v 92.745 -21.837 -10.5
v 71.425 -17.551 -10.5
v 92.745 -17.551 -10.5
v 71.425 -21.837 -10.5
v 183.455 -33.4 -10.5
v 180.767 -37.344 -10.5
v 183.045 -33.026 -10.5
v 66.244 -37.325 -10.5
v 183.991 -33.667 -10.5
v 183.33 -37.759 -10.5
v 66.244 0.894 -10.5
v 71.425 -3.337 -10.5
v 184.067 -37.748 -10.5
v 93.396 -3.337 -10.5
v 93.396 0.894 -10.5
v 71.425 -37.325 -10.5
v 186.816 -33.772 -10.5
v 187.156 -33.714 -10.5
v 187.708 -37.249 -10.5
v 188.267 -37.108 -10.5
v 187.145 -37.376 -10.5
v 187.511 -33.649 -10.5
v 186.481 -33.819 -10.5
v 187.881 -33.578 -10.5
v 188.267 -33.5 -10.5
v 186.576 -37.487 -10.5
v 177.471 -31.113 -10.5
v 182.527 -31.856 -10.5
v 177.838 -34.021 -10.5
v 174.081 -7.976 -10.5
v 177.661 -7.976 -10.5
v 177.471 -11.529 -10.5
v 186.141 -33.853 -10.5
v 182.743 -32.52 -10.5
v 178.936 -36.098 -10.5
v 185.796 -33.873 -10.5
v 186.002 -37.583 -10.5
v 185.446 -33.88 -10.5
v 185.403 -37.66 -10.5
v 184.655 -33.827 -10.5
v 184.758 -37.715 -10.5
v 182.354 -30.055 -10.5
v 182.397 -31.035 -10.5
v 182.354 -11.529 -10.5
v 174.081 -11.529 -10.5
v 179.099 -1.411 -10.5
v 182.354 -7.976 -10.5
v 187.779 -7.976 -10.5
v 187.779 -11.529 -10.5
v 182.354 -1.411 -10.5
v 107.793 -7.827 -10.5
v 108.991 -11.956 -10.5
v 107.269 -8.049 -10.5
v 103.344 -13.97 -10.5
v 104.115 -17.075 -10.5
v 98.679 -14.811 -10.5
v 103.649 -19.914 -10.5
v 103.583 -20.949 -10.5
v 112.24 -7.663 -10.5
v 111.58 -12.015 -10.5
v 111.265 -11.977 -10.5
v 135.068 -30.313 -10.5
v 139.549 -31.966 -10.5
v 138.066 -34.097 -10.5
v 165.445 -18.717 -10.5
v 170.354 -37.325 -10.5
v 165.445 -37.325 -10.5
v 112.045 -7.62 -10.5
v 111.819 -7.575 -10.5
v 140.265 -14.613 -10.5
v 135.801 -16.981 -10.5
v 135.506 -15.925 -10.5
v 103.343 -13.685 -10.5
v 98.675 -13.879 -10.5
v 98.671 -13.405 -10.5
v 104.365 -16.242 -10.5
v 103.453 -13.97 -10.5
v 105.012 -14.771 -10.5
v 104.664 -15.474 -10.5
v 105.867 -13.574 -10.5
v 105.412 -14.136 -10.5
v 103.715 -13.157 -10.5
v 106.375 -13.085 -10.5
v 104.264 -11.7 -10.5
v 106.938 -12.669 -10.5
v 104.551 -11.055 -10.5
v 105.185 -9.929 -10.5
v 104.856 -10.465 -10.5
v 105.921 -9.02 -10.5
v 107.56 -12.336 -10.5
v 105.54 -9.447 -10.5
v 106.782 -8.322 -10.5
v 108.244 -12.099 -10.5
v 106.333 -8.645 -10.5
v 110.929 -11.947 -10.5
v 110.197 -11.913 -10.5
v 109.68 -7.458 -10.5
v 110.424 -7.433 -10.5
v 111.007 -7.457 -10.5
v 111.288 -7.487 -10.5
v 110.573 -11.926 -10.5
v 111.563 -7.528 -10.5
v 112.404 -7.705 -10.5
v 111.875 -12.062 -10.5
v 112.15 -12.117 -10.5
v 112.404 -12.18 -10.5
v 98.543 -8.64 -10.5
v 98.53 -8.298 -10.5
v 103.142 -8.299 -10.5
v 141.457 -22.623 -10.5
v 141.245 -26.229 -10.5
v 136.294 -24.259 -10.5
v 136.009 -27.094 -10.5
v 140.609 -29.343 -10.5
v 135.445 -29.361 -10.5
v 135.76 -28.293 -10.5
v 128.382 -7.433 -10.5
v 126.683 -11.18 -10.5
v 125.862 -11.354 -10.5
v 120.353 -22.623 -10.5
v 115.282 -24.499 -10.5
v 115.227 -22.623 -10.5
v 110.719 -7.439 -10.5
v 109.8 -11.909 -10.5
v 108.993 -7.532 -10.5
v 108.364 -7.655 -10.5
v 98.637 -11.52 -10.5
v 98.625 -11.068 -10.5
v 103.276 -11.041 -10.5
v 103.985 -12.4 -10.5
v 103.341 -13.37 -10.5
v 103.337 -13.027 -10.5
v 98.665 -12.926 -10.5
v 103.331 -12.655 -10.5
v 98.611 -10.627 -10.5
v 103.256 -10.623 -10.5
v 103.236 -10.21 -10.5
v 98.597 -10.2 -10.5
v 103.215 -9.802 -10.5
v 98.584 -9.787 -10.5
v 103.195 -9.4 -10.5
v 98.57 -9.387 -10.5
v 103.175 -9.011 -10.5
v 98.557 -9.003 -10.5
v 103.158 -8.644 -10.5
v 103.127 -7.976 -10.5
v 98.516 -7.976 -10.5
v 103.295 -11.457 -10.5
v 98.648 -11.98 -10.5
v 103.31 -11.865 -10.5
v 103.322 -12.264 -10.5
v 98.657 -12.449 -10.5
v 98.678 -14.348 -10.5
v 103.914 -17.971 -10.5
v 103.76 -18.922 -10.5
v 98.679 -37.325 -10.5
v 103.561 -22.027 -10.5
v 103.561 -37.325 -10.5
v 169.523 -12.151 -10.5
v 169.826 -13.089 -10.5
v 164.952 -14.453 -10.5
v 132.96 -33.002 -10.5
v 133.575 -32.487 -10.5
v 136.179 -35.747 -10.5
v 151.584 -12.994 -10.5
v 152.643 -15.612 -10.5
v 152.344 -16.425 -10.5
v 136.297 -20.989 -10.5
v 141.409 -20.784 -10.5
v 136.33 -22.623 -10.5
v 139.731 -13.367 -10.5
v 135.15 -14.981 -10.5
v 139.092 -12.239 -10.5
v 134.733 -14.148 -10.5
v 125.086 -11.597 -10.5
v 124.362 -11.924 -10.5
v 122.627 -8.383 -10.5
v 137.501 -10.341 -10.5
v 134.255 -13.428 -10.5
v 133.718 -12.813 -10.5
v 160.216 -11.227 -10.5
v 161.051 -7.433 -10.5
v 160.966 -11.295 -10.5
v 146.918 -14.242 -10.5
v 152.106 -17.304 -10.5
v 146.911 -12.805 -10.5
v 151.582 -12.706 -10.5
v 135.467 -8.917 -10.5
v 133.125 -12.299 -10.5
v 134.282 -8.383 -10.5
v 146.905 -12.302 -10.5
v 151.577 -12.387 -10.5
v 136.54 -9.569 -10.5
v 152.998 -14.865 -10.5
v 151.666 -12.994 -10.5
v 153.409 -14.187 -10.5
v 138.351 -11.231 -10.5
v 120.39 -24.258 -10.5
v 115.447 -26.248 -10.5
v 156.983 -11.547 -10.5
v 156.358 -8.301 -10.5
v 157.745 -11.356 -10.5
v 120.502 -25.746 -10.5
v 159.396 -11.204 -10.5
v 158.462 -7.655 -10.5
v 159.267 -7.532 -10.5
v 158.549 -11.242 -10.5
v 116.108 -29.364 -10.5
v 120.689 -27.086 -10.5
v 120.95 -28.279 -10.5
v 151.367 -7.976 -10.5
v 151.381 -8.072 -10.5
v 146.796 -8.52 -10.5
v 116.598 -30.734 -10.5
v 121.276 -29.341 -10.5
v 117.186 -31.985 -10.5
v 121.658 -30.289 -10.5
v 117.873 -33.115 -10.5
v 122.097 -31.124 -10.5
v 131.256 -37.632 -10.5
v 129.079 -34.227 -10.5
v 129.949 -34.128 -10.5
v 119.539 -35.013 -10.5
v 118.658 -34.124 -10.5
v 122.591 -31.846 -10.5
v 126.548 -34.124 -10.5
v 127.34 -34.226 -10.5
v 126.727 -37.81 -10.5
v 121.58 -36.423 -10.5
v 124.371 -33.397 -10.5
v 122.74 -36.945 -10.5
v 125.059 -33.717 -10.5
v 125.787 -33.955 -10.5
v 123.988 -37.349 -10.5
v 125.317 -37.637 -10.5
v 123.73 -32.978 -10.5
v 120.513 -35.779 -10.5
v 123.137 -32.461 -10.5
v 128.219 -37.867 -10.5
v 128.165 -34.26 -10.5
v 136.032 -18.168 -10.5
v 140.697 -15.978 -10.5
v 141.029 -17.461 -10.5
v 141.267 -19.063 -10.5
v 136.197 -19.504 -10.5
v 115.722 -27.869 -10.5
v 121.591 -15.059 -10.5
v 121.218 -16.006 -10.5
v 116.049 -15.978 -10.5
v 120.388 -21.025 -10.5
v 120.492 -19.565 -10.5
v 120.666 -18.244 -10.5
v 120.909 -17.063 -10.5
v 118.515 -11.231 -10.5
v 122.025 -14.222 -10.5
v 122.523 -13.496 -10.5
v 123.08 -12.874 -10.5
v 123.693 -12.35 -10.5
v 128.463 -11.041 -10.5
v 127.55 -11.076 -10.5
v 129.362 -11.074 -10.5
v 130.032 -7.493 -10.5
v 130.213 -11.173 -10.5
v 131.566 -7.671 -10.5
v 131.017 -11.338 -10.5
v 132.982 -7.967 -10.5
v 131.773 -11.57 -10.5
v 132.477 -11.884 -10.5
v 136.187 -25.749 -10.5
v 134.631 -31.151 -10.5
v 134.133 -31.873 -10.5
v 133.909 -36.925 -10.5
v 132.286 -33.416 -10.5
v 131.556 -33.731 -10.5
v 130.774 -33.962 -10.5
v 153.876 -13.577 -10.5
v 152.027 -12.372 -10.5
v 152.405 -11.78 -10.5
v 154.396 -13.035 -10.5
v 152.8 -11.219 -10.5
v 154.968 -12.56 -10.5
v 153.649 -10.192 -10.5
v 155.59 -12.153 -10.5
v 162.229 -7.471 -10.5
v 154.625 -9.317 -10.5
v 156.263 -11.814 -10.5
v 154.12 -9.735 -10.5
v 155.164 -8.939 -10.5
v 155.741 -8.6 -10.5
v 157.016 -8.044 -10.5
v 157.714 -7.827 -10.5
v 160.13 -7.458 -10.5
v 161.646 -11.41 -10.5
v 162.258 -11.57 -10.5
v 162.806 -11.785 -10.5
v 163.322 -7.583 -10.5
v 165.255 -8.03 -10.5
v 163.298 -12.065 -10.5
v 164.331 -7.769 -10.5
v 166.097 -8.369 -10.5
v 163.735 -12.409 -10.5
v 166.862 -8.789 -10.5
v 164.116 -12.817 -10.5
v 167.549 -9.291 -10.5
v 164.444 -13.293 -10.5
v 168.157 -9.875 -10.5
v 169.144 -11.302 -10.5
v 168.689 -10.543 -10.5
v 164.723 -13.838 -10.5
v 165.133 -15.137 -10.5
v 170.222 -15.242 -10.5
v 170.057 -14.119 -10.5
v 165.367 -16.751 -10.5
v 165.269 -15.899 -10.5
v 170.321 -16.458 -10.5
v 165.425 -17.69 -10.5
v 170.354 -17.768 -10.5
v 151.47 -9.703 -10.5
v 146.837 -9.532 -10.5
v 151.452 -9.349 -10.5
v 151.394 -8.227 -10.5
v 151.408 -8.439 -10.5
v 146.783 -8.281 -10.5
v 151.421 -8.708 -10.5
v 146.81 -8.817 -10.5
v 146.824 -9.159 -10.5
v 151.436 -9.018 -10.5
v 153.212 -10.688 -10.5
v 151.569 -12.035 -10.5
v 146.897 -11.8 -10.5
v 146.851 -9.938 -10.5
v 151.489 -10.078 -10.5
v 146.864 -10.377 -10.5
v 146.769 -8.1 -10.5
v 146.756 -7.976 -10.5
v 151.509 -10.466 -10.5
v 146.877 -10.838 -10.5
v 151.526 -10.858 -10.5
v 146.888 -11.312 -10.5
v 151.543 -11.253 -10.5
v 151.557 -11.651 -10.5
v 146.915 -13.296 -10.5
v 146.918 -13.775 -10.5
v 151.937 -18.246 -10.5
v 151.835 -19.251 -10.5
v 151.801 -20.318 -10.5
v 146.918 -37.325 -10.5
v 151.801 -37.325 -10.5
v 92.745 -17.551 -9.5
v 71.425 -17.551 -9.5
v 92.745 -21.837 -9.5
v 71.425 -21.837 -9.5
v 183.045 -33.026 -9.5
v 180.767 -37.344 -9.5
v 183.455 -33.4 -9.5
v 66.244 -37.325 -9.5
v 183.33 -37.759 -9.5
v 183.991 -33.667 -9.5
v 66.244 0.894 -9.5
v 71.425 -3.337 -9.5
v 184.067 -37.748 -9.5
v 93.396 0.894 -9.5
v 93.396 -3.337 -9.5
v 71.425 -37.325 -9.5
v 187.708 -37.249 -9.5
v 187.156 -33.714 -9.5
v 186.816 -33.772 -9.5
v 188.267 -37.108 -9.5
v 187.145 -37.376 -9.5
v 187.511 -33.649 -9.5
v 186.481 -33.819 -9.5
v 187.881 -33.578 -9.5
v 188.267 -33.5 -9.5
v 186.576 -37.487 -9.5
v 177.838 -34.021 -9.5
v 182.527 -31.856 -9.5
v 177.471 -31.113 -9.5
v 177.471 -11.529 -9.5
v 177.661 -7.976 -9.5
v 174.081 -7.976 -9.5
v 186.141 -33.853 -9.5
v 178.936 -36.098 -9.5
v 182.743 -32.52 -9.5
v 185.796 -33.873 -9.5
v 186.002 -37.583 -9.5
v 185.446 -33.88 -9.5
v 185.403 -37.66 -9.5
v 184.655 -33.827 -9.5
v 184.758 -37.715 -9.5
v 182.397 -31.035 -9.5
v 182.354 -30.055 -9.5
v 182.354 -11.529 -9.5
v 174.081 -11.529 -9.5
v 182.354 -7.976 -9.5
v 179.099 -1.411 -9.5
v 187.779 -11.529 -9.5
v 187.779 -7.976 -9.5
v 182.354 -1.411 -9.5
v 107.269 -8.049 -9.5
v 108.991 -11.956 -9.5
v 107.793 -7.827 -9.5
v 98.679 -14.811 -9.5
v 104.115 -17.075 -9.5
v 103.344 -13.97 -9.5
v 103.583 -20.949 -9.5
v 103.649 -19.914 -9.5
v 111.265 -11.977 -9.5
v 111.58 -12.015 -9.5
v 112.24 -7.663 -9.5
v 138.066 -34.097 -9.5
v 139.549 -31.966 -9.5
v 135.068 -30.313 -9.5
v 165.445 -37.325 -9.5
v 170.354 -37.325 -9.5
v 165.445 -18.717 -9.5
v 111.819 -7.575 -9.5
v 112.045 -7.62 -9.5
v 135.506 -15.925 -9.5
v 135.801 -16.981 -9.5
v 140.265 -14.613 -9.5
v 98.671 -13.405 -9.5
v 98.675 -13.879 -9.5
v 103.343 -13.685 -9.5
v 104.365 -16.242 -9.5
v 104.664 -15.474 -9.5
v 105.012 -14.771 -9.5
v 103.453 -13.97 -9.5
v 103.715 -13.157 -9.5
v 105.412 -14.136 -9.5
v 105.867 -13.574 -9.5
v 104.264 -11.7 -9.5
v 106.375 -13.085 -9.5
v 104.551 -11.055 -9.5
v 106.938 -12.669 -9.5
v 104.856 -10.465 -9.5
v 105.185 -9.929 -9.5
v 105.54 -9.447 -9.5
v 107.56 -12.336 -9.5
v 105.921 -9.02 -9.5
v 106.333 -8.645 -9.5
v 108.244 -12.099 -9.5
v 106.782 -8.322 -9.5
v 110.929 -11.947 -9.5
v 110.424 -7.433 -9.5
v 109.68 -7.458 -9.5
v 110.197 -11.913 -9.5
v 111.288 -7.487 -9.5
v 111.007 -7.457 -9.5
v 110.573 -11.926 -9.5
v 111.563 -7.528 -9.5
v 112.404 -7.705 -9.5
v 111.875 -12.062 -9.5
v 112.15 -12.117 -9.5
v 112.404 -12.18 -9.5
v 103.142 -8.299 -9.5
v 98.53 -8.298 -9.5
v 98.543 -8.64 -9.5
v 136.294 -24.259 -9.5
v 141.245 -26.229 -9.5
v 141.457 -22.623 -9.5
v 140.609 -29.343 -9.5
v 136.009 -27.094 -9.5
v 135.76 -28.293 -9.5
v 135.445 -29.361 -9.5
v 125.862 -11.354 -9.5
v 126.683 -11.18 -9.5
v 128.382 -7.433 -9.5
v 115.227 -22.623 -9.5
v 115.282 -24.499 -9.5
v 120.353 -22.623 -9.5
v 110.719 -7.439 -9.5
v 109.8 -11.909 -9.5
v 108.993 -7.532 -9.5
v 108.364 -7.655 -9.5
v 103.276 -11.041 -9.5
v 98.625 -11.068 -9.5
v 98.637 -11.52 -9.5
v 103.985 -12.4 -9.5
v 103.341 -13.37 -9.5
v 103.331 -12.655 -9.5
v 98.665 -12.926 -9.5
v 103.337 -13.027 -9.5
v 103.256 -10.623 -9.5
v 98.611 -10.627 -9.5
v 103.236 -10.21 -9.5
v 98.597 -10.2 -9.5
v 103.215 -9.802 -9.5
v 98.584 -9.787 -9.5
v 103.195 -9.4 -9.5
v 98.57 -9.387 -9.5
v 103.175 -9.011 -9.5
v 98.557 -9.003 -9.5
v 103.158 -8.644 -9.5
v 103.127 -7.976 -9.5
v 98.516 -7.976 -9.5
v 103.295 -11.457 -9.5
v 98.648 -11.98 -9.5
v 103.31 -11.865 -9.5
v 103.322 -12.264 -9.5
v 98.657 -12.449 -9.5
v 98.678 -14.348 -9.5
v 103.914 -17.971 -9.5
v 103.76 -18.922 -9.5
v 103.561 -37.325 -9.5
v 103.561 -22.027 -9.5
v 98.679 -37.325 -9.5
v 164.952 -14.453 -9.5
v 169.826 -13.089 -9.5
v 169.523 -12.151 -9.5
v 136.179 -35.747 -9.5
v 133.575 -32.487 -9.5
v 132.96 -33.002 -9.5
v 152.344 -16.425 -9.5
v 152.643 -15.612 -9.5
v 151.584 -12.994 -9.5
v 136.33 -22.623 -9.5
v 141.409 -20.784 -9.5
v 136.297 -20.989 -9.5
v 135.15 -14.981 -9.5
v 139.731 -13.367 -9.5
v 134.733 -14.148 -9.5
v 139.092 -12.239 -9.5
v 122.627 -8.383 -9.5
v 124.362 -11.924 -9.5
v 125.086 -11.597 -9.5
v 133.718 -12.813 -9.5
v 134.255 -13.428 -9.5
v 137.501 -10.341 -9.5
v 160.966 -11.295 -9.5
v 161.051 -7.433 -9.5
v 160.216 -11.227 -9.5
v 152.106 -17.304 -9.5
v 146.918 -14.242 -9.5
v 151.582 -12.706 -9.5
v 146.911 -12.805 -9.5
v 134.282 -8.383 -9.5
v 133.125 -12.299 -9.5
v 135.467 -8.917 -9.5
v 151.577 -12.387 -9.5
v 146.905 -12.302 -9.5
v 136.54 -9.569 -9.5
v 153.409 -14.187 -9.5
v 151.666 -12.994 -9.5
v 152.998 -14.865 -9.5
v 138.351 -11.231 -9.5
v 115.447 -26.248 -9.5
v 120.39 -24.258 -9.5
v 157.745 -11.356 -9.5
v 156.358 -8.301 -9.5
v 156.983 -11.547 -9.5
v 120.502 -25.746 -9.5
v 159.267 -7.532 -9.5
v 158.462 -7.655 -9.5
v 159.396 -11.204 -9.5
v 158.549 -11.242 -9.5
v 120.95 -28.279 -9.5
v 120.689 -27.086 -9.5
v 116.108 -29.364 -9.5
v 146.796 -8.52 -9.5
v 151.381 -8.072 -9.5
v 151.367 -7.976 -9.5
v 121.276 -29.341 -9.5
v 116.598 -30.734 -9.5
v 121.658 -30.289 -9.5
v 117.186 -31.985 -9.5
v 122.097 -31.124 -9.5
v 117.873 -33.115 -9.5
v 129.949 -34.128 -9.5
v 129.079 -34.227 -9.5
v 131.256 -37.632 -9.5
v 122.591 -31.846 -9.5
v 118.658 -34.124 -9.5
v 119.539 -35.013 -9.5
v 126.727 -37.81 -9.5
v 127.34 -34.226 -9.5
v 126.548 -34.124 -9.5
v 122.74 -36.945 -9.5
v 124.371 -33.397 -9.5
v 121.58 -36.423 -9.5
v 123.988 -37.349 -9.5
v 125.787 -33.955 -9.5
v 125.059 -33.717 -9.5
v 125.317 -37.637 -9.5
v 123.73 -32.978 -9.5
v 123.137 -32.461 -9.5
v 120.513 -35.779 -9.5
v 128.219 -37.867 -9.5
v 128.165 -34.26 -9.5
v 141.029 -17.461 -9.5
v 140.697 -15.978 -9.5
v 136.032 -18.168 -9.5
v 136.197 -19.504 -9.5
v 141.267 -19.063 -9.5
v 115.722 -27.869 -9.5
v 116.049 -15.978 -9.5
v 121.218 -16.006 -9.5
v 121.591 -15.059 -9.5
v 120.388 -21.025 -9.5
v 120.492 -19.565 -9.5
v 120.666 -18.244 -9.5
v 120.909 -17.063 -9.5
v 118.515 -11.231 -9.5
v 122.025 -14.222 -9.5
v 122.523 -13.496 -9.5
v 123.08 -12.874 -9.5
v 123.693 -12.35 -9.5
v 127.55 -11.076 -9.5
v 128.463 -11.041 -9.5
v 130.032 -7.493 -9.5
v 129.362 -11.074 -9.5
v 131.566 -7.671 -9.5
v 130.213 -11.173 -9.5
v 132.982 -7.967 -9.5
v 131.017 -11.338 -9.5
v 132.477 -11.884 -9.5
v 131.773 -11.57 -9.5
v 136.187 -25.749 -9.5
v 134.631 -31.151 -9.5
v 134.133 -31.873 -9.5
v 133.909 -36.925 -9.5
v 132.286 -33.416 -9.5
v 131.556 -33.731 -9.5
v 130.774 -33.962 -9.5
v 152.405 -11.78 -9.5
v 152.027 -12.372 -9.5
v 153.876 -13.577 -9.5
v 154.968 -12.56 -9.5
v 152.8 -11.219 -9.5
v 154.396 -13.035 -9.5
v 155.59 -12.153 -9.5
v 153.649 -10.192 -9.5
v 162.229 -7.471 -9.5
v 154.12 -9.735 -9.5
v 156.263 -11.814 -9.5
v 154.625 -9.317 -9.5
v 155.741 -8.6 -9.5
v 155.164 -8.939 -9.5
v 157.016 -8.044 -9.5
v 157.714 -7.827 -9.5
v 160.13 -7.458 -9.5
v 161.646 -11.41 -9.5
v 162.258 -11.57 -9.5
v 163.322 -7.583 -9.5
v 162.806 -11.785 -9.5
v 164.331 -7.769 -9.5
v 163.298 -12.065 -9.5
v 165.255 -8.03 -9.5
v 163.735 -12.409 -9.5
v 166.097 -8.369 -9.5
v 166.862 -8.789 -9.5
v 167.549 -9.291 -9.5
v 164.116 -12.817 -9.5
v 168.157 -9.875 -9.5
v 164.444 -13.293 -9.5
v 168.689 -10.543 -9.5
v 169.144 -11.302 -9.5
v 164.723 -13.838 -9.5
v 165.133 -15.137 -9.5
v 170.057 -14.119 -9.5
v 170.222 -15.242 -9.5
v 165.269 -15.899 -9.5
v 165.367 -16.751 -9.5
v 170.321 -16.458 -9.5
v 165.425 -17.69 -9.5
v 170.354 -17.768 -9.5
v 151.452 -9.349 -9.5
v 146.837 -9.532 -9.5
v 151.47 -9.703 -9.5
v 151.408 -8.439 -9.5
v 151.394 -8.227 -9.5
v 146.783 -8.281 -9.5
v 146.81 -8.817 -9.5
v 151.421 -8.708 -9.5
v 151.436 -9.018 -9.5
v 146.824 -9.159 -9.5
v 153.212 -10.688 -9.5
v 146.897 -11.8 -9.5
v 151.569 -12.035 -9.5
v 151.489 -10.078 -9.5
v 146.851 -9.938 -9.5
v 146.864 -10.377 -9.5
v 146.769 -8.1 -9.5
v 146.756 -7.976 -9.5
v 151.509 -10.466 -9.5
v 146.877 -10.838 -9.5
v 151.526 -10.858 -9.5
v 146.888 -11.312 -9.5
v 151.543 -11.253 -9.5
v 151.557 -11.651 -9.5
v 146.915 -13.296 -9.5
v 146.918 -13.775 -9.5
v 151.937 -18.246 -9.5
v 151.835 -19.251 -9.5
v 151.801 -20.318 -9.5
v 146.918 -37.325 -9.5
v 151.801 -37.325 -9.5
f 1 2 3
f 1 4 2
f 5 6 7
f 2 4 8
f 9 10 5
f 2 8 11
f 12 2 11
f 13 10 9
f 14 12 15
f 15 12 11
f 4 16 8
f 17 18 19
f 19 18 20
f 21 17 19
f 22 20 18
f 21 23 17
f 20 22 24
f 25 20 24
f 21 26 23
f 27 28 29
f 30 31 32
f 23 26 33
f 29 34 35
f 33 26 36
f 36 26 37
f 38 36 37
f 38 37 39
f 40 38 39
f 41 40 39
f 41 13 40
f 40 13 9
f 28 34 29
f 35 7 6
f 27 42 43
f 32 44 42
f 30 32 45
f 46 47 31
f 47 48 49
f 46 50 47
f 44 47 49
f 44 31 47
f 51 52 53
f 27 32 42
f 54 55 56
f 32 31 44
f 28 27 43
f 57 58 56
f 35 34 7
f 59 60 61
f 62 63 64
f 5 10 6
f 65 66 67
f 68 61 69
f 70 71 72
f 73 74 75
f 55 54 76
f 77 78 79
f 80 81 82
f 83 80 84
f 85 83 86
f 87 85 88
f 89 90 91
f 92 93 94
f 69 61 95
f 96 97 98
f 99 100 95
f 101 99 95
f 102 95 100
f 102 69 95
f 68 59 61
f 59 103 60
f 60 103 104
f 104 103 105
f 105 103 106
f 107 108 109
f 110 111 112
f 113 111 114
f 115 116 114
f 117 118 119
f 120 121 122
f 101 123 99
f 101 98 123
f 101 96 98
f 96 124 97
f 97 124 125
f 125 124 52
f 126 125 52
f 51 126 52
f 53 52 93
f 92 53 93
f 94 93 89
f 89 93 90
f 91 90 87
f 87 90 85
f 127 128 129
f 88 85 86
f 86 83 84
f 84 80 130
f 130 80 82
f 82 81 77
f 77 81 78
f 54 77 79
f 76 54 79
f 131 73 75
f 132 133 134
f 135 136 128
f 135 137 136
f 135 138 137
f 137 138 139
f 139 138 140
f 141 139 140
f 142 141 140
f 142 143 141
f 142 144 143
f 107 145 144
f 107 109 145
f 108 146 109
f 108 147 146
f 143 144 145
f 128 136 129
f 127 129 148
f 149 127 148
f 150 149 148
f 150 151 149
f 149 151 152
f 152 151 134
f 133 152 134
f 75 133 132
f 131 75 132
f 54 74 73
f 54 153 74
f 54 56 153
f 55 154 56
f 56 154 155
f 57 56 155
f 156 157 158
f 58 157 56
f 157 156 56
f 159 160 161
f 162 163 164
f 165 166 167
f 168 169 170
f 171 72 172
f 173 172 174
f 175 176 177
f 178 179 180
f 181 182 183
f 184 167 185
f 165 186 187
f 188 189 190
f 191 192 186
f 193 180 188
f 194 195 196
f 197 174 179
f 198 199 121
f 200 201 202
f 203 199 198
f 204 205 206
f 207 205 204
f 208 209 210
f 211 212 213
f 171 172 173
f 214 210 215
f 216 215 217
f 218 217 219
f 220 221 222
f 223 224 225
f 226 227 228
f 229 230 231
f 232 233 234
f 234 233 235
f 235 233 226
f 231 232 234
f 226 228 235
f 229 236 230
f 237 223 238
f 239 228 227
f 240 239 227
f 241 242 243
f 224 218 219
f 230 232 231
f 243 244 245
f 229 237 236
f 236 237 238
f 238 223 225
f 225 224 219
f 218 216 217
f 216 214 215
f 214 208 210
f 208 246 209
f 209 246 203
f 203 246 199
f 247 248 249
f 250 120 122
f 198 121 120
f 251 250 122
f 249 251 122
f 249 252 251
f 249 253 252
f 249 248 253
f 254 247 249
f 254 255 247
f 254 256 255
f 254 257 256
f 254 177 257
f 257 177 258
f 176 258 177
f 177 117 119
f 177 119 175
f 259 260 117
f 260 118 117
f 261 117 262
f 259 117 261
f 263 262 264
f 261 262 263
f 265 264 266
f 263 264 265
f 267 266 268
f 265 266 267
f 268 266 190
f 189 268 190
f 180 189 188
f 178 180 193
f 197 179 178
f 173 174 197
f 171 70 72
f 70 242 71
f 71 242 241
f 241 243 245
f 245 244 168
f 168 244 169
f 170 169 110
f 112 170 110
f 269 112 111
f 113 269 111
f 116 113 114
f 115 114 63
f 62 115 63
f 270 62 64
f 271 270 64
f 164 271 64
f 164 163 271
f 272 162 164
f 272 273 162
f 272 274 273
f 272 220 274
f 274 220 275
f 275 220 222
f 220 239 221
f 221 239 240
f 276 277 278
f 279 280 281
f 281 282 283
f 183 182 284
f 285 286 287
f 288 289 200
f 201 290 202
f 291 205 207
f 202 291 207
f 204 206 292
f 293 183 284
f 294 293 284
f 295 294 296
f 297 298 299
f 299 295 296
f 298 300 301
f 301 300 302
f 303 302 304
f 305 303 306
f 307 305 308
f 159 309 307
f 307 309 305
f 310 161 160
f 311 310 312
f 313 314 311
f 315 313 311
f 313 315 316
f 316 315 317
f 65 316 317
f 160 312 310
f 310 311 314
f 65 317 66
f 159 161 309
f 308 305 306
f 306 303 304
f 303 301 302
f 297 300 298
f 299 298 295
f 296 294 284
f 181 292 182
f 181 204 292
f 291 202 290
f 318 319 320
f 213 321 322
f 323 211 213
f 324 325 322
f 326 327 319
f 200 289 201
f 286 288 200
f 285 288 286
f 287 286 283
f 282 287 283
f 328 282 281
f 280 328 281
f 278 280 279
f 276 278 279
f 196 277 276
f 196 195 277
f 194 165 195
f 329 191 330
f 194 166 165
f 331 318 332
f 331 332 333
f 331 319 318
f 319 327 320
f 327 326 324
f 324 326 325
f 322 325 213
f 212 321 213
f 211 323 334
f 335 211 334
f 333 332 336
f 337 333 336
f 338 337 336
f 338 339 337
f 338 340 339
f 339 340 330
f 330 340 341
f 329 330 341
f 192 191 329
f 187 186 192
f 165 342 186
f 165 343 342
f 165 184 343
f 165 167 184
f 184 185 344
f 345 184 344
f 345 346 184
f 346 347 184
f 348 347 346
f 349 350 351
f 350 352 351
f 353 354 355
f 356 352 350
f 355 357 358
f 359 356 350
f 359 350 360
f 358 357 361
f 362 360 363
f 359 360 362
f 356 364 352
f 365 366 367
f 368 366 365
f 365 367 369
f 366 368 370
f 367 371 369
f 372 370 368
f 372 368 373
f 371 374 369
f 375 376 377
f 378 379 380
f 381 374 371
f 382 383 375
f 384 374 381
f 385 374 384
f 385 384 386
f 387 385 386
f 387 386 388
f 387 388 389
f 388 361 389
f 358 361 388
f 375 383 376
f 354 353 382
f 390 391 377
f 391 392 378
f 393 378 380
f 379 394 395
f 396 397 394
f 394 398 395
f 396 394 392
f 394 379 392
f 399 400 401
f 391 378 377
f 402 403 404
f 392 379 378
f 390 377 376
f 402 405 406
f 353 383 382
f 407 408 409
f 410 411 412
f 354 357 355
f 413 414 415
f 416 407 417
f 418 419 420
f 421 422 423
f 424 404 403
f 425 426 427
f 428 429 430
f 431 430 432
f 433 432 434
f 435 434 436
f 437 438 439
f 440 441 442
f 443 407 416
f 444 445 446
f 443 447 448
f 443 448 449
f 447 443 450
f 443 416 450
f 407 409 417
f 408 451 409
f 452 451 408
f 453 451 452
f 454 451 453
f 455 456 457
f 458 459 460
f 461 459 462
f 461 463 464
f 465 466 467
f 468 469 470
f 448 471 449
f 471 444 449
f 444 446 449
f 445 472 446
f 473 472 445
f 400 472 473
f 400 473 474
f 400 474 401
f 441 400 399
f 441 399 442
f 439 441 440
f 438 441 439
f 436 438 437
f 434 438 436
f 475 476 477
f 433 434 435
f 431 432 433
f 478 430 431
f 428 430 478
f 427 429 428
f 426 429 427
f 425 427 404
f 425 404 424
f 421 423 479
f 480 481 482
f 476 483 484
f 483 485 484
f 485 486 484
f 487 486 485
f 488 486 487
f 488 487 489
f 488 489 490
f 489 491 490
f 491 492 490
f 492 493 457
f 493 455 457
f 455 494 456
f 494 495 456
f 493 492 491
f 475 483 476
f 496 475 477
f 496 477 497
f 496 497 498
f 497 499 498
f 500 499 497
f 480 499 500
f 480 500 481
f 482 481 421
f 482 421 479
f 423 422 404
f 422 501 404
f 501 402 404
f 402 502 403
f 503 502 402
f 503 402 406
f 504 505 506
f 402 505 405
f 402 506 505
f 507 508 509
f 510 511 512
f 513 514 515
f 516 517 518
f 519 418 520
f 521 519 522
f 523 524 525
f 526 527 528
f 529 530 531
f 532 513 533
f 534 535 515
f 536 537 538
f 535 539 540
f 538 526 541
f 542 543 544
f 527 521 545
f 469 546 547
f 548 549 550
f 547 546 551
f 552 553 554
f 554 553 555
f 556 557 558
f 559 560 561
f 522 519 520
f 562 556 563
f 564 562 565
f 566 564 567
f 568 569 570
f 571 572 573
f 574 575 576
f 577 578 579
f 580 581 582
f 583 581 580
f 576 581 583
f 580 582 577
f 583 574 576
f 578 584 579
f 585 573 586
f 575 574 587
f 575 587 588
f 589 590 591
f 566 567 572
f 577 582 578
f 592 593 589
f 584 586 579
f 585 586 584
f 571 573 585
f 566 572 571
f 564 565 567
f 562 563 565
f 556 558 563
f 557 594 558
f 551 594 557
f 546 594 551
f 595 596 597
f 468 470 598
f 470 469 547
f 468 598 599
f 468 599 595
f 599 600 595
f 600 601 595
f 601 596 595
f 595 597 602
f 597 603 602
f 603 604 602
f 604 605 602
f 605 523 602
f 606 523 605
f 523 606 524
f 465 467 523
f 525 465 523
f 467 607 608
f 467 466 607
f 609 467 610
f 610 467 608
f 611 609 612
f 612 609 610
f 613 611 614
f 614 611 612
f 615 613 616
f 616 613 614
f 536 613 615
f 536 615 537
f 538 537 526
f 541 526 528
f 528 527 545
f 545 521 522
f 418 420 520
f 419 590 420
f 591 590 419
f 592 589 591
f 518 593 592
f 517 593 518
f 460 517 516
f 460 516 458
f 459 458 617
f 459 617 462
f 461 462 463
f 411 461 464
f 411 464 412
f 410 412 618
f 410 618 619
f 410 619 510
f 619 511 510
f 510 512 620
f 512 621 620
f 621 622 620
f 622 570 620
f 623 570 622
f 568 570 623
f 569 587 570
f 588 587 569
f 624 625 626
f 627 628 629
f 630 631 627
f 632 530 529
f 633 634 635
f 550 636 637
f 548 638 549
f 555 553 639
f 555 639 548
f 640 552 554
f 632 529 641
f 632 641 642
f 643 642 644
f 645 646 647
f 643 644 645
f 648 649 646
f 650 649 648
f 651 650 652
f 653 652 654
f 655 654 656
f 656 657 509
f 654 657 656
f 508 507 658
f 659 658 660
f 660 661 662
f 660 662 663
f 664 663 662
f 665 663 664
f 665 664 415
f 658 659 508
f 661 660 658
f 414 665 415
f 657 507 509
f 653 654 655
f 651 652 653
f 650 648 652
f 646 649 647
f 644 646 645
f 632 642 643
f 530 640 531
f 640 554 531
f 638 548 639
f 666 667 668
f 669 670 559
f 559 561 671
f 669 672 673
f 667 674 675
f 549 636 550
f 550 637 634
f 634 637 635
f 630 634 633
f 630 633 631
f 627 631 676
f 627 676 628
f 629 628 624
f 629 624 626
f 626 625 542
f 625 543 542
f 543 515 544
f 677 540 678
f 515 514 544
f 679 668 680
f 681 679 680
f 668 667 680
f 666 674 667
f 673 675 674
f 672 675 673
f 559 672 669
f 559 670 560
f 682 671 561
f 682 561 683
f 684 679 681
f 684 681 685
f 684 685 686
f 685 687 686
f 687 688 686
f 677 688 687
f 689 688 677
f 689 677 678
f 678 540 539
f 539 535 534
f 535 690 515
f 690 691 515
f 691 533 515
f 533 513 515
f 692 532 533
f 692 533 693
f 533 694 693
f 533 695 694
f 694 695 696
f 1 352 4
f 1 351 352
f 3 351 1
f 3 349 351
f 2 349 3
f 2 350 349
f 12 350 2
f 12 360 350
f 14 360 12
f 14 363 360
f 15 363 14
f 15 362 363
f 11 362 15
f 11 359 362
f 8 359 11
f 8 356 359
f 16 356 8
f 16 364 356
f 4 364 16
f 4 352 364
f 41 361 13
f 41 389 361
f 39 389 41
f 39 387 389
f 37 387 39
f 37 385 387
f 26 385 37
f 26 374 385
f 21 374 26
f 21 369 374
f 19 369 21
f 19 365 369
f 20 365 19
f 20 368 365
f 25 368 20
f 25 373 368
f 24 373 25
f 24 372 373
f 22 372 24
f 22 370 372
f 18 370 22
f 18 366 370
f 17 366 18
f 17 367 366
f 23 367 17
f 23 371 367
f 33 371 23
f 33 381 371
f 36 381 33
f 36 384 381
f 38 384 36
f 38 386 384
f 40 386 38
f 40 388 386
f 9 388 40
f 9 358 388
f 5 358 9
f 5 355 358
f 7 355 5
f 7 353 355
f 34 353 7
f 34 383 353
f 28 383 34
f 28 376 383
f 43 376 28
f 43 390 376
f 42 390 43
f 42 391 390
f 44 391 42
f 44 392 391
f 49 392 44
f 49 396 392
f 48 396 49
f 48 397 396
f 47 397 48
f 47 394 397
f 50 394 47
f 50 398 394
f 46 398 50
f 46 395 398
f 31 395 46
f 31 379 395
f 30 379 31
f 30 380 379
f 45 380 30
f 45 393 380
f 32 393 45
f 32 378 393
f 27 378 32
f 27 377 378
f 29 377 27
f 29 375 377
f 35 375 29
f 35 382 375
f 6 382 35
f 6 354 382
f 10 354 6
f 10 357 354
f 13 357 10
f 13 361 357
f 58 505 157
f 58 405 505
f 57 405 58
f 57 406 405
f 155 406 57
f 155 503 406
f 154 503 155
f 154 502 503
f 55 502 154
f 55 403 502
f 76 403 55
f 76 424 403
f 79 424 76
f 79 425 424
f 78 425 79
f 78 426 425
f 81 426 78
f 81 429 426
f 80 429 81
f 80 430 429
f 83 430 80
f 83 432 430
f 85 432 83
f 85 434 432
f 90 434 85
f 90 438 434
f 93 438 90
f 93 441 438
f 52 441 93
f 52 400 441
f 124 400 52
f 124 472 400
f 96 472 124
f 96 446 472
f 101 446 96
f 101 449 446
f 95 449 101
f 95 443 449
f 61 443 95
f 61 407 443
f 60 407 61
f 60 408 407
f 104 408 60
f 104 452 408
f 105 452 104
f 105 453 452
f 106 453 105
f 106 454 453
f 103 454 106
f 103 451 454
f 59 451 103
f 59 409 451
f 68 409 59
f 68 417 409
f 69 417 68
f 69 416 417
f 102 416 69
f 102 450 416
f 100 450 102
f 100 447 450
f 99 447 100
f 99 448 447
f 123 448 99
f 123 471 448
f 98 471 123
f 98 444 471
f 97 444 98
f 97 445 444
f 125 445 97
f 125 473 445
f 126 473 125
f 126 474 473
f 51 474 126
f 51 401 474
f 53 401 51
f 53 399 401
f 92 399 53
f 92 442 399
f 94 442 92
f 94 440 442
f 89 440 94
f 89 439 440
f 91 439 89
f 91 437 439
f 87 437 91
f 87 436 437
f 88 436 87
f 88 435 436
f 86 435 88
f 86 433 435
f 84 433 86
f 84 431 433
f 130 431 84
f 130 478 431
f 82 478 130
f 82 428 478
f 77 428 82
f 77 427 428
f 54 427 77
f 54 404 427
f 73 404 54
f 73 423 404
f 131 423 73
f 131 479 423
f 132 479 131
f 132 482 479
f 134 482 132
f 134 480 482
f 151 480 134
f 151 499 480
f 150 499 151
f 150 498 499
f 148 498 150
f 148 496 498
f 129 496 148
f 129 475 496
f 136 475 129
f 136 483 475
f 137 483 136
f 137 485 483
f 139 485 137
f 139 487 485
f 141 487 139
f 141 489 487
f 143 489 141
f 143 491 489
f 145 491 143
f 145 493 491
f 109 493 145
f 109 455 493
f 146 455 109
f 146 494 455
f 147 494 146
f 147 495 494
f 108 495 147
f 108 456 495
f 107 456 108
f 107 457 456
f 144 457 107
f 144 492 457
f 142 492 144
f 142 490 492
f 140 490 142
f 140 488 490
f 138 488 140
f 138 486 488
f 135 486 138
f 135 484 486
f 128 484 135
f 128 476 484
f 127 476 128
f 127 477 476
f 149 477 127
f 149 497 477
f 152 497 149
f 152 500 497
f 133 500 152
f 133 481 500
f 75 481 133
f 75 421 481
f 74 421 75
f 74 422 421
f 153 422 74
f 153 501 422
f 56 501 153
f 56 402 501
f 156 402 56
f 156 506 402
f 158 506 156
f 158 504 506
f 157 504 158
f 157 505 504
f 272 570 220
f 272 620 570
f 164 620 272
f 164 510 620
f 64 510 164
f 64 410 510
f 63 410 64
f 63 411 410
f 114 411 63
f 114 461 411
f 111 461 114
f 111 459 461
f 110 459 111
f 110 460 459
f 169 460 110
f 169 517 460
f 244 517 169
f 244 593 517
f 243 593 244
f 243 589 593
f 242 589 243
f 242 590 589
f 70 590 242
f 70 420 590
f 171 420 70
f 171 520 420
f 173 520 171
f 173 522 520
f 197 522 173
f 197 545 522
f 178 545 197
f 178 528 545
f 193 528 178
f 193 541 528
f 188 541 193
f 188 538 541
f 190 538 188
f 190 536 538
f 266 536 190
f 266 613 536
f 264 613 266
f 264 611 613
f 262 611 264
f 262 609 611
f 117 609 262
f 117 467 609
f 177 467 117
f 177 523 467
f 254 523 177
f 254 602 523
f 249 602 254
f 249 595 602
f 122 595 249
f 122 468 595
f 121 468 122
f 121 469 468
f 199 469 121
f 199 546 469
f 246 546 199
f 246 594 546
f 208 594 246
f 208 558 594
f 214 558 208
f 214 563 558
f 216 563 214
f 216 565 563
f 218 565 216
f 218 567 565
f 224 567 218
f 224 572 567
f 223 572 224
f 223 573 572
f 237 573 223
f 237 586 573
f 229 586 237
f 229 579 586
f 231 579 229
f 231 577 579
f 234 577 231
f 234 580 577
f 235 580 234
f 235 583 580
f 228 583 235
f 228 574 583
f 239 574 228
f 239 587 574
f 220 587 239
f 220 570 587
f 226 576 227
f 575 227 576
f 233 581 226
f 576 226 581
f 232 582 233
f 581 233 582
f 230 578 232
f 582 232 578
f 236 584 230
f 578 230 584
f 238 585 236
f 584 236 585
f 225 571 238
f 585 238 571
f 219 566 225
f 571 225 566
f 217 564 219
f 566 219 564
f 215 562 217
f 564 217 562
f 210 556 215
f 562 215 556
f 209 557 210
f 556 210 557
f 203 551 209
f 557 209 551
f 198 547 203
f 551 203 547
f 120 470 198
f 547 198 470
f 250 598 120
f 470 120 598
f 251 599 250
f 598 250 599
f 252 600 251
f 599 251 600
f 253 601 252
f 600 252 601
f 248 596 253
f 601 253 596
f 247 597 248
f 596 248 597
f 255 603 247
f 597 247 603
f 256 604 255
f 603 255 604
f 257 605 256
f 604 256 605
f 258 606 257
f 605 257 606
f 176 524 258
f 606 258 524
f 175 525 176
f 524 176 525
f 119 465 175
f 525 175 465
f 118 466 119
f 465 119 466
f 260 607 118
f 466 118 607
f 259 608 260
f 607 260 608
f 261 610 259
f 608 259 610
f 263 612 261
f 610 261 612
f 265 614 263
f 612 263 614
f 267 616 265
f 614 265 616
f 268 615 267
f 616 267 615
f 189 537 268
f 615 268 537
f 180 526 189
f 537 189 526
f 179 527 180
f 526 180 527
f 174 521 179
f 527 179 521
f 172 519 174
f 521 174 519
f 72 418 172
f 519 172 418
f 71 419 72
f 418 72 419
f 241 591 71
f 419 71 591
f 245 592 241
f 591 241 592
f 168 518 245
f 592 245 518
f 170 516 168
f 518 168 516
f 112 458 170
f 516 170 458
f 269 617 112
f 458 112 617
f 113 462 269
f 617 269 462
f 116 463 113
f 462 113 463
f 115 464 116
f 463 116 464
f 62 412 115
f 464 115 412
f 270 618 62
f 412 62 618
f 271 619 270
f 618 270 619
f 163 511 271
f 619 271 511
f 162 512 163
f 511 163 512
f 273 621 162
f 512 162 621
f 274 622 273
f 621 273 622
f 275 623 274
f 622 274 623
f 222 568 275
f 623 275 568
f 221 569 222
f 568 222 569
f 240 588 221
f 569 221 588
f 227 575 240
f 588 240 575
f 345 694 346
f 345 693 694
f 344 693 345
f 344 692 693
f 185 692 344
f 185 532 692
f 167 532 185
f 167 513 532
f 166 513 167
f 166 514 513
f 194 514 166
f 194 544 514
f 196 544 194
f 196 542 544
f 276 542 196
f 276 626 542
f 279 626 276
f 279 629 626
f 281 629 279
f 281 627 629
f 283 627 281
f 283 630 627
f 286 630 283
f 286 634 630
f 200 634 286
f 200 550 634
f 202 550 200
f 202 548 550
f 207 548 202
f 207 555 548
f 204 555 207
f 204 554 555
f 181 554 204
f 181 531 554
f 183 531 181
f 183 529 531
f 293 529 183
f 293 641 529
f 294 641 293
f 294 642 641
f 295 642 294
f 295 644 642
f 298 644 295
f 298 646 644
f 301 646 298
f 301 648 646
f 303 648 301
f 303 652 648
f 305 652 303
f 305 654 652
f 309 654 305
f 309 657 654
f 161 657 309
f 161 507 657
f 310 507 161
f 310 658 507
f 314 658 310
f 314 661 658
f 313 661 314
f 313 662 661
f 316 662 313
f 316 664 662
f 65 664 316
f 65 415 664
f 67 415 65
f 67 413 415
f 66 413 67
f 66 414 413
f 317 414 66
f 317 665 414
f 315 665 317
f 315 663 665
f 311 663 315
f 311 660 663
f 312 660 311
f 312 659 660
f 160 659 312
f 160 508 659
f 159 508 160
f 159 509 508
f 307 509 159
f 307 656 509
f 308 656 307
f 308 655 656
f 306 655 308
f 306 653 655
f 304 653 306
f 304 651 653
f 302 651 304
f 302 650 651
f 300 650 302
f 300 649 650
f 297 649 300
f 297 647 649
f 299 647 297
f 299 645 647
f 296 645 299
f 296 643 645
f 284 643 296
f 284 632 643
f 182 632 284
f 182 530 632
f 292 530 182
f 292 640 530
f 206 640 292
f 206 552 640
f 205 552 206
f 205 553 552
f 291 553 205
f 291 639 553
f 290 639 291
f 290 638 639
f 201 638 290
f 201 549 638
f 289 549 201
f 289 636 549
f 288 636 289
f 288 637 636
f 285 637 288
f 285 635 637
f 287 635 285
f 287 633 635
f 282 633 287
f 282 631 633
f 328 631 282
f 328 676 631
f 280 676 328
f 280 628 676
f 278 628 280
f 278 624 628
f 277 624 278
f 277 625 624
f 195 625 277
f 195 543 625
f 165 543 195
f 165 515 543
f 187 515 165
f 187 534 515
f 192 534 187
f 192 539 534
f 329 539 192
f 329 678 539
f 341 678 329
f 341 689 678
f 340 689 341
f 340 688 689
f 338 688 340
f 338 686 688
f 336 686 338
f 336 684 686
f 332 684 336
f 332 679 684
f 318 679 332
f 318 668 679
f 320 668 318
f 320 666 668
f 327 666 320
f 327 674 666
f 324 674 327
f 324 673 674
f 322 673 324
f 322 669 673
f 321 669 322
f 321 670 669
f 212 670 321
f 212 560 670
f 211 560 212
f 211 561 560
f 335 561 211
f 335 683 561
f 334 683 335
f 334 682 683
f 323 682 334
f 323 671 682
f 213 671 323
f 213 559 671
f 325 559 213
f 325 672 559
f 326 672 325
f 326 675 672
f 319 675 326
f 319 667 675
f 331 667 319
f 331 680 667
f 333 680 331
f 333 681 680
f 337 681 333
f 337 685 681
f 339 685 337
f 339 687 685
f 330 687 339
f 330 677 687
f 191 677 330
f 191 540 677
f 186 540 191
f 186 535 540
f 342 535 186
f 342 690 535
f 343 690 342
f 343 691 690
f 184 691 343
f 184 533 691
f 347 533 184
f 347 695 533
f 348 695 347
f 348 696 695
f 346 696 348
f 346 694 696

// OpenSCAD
// Start: lazy_union
default_5_default_5();
// End: lazy_union

// Modules.

// 'PartMaterial undef-default - default 5.0'
module default_5_default_5() {
  // 'None : _combine_solids_and_holes'
  union() {
    // 'default : _combine_solids_and_holes'
    union() {
      // 'volume'
      %color(c=[0.4980392156862745, 1.0, 0.8313725490196079, 0.3]) {
        // 'volume : _combine_solids_and_holes'
        union() {
          // 'volume'
          cube(size=[250.0, 210.0, 210.0]);
        }
      }
      // 'plate'
      %multmatrix(m=[[1.0, 0.0, 0.0, 0.0], [0.0, 1.0, 0.0, 0.0], [0.0, 0.0, 1.0, -4.005], [0.0, 0.0, 0.0, 1.0]]) {
        // 'plate'
        color(c=[0.6470588235294118, 0.16470588235294117, 0.16470588235294117, 0.3]) {
          // 'plate : _combine_solids_and_holes'
          union() {
            // 'plate'
            cube(size=[250.0, 210.0, 4.0]);
          }
        }
      }
      // 'front_label'
      multmatrix(m=[[1.0, 0.0, 0.0, 125.0], [0.0, 1.0, 0.0, 0.0], [0.0, 0.0, 1.0, -10.5], [0.0, 0.0, 0.0, 1.0]]) {
        // 'front_label : _combine_solids_and_holes'
        union() {
          // 'front_label'
          linear_extrude(height=1.0) {
            translate(v=[0.0, 0.0, -0.5]) {
              text(text="Front", size=40.0, halign="center", valign="top", spacing=1.0, direction="ltr");
            }
          }
        }
      }
    }
  }
} // end module default_5_default_5
